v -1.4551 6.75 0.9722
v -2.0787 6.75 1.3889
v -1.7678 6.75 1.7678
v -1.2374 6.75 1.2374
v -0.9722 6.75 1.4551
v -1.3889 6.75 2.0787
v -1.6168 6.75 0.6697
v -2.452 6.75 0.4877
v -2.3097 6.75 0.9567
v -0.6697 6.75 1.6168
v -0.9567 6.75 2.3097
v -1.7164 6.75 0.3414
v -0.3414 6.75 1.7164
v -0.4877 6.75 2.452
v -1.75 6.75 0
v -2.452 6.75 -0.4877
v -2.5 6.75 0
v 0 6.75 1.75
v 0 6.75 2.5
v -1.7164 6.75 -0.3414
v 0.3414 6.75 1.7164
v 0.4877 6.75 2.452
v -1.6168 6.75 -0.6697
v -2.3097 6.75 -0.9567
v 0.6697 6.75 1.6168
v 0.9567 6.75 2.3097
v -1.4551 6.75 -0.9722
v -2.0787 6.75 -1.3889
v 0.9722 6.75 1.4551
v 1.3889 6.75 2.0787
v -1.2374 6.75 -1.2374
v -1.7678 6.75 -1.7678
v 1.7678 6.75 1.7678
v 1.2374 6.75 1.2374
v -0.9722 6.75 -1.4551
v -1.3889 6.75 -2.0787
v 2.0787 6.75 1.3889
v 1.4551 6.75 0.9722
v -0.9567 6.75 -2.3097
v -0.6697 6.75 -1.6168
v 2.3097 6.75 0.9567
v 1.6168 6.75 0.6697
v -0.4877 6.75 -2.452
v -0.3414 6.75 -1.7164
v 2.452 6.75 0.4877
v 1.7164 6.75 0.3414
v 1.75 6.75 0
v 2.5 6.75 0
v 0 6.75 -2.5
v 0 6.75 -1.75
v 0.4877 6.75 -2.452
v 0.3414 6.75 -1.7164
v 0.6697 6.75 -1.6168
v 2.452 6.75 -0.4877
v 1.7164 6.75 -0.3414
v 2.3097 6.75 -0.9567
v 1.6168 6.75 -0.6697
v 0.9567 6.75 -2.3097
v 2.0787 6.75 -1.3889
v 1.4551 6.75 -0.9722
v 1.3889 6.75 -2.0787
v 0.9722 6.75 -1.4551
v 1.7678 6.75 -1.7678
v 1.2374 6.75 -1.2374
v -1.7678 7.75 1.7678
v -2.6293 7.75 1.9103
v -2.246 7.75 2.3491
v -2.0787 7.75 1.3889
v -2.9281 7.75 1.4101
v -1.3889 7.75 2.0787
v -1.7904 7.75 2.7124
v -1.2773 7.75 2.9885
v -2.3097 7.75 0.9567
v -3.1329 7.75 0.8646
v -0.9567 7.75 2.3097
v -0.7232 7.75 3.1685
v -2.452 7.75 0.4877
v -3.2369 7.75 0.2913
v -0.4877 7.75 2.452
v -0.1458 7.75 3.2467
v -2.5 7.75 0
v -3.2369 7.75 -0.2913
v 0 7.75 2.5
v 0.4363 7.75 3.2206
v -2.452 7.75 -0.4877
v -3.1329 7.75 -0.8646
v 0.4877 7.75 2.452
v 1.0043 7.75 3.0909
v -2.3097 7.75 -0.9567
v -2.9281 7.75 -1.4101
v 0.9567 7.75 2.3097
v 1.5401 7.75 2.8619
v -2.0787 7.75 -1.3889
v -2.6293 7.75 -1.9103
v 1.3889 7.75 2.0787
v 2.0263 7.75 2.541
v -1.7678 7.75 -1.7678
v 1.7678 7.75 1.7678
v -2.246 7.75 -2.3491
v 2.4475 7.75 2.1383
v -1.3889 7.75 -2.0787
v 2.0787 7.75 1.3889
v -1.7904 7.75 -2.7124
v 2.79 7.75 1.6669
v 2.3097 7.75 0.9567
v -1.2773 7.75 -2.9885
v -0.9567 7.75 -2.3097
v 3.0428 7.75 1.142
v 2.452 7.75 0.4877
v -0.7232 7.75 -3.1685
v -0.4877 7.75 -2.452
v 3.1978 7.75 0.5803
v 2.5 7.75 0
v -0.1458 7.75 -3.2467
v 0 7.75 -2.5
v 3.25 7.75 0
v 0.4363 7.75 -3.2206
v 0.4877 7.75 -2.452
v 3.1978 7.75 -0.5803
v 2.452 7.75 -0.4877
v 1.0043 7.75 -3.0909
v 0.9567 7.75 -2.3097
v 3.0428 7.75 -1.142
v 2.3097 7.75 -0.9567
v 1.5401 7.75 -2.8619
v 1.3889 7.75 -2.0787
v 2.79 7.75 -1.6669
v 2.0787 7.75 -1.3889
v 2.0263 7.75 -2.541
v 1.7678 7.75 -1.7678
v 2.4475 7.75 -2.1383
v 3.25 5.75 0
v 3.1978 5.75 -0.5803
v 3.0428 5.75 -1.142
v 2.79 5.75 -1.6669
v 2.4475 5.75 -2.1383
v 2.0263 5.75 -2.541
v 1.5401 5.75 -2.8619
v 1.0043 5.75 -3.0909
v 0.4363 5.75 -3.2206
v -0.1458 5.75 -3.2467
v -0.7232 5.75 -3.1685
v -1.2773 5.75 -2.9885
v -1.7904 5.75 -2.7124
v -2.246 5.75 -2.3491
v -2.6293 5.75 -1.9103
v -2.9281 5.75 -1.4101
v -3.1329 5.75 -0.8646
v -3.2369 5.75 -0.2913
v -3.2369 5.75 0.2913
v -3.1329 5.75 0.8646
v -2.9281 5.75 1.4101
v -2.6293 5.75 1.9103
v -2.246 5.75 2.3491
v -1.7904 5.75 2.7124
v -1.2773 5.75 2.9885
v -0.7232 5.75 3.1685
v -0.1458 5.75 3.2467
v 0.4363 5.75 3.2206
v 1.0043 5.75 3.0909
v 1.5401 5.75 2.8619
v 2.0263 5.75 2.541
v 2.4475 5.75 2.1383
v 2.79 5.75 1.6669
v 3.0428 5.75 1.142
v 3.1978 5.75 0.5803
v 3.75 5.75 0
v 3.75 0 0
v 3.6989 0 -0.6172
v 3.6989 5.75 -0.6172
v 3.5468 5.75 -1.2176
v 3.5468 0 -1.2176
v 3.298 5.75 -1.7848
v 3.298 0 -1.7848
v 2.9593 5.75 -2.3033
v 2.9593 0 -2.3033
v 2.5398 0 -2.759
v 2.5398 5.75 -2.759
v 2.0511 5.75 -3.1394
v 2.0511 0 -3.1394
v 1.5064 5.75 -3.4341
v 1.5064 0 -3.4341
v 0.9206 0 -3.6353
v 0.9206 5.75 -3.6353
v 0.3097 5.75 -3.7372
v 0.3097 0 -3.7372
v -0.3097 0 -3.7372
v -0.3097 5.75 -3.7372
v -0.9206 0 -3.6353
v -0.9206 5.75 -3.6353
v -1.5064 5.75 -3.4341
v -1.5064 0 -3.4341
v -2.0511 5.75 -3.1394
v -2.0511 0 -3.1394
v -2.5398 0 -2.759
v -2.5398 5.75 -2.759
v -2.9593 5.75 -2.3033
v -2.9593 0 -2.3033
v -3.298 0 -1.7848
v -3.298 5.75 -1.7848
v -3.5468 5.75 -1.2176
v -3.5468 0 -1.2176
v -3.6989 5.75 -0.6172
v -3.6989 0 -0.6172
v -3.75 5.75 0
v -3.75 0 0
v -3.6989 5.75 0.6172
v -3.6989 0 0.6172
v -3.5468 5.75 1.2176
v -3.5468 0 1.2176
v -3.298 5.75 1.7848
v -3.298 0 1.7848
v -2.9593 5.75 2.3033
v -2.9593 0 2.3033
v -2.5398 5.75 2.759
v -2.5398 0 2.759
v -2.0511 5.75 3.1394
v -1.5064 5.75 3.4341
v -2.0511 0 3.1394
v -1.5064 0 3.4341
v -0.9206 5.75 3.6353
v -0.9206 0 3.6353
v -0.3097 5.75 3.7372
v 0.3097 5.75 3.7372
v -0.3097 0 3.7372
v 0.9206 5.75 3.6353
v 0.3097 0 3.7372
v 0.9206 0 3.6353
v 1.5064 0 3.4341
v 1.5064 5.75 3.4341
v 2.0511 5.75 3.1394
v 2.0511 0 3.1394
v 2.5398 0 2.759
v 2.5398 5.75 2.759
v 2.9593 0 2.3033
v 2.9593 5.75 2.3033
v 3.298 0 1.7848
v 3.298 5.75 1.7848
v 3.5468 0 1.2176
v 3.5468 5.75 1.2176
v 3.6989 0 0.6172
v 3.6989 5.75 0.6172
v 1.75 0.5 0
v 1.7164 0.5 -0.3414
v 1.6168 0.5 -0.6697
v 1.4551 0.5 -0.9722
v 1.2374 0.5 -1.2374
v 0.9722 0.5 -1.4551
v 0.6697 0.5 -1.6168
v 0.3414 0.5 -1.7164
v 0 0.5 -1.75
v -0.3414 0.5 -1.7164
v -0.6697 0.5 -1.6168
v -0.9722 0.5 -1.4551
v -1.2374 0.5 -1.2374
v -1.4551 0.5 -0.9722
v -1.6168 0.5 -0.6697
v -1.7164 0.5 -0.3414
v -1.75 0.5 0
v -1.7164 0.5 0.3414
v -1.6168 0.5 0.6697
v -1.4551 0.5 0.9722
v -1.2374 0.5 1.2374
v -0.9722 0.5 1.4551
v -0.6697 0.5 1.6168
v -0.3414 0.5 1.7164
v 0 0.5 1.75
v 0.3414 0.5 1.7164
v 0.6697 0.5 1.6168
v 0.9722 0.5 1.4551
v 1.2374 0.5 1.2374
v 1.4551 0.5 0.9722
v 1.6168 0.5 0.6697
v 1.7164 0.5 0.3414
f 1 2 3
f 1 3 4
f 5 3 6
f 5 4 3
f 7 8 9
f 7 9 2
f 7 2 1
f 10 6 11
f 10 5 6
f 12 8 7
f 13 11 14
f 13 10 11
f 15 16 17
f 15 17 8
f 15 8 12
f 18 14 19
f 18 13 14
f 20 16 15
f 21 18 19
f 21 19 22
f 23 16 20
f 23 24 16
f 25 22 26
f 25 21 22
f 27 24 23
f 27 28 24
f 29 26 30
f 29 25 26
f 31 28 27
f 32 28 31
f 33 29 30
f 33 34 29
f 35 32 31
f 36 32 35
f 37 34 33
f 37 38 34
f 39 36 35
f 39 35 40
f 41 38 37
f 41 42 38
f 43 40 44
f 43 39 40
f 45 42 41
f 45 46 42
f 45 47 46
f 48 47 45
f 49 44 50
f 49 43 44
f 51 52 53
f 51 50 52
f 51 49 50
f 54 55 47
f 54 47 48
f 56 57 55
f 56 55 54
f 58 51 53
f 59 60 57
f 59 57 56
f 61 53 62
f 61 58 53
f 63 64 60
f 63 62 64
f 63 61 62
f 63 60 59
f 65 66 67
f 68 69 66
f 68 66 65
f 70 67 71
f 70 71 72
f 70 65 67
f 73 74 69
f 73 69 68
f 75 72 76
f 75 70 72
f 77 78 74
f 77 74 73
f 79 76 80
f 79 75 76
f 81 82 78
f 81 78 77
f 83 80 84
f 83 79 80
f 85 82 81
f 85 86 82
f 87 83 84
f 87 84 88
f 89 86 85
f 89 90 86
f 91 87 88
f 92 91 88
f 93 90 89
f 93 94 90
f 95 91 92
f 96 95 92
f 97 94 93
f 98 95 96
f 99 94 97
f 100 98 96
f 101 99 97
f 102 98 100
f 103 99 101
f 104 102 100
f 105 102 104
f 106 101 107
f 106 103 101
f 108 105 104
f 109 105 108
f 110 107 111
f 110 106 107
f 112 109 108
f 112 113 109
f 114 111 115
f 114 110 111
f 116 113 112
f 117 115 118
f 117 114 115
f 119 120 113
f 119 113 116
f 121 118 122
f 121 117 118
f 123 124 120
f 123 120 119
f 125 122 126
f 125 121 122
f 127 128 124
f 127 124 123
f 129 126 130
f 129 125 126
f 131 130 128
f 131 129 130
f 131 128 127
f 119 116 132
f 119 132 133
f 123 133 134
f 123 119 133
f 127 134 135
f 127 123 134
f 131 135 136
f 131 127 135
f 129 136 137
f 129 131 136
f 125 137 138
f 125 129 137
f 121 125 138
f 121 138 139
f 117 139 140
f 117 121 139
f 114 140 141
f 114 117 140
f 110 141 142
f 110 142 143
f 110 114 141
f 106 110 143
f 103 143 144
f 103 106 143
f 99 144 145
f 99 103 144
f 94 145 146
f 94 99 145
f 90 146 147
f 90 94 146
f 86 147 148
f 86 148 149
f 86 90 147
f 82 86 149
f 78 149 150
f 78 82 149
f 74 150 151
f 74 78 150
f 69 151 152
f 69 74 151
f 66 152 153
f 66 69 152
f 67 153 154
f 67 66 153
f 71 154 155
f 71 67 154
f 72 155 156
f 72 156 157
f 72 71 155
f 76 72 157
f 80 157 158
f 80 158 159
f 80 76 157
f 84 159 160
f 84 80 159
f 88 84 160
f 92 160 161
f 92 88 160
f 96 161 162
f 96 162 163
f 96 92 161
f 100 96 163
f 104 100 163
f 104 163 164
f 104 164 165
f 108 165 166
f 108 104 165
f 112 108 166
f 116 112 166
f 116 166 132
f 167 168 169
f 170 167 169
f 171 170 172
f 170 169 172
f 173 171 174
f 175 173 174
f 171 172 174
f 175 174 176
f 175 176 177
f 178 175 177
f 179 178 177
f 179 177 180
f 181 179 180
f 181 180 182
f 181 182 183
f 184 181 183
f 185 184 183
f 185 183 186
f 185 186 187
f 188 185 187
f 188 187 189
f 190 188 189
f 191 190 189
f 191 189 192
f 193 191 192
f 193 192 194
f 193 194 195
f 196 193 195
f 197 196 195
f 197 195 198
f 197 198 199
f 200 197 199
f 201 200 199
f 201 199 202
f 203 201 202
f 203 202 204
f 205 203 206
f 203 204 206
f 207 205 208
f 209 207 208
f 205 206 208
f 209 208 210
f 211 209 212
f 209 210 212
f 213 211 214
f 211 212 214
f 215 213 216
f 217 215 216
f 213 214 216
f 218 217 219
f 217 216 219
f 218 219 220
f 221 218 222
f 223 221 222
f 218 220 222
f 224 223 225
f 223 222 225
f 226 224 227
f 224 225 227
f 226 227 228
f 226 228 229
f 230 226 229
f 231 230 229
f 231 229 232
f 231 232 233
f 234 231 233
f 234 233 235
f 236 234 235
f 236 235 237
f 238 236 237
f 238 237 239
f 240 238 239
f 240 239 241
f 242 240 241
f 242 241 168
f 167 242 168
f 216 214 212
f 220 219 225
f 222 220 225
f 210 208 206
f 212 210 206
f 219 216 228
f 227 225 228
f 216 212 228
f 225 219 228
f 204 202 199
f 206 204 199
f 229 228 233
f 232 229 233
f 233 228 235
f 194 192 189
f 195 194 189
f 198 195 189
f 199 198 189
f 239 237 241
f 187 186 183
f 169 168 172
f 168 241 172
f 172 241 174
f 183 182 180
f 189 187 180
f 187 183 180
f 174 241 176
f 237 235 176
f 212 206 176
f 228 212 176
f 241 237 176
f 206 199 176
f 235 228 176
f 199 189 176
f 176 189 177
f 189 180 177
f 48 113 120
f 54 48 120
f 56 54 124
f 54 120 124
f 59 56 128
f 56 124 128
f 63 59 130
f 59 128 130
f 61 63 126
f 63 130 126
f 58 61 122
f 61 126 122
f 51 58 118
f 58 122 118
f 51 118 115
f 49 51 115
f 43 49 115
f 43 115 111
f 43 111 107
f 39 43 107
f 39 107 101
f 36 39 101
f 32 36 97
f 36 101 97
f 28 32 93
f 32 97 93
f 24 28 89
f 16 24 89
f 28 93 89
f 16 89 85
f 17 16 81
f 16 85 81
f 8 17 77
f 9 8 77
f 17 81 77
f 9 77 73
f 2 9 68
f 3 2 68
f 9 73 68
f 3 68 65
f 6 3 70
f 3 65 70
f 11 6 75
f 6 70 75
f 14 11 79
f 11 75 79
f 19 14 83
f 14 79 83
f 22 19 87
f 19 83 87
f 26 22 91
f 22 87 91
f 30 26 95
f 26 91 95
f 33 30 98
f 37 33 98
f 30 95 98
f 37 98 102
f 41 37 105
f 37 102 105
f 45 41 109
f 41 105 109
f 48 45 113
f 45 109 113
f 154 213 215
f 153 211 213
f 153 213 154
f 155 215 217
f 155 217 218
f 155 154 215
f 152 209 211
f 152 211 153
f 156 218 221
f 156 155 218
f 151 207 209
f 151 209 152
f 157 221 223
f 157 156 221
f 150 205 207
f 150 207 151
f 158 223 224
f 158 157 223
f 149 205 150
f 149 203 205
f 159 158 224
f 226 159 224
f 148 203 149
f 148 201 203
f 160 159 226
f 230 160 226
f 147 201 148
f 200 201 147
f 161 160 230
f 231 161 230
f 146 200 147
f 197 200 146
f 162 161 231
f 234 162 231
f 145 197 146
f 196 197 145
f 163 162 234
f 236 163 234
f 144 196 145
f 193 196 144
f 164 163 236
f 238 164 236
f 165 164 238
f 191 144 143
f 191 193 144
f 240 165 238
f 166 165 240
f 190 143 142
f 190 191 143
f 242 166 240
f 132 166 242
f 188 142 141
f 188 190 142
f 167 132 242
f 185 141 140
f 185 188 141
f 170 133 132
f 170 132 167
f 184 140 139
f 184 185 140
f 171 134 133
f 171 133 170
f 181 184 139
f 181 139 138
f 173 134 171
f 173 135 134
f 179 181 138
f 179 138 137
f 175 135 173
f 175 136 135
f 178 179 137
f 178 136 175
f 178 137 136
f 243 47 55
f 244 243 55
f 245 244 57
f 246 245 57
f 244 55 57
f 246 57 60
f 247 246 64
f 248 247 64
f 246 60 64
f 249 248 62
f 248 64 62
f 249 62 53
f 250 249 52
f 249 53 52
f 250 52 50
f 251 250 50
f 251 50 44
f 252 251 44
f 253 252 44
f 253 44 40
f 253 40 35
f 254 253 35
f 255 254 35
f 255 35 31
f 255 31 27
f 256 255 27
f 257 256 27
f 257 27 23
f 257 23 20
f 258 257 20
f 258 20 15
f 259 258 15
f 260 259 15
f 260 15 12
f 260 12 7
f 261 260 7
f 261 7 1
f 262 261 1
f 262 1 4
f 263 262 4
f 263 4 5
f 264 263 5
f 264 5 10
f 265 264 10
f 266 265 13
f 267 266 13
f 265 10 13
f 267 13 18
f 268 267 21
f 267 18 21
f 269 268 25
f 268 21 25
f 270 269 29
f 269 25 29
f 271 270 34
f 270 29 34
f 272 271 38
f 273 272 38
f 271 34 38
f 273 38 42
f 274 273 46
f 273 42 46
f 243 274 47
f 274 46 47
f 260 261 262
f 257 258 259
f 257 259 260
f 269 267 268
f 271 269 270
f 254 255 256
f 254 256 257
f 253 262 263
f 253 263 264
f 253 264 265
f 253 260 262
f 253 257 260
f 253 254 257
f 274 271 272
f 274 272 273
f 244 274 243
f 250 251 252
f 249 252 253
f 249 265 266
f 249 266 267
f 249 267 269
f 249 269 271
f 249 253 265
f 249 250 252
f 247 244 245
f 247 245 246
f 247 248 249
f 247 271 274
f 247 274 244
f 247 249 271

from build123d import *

# Parameters (mm, degrees)
SKETCH1_R           = 3.75
BOSS_EXTRUDE1_DEPTH = 7.75
SKETCH3_R           = 3.75
SKETCH3_R_2         = 3.25
CUT_EXTRUDE1_DEPTH  = 2
SKETCH4_R           = 1.75
CUT_EXTRUDE2_DEPTH  = 7.25
SKETCH5_R           = 2.5
CUT_EXTRUDE3_DEPTH  = 1


with BuildPart() as part:
    # Sketch1 → Boss-Extrude1 (new body)
    with BuildSketch(Plane(origin=(0, 0, 0), x_dir=(1, 0, 0), z_dir=(0, 1, 0))):
        Circle(SKETCH1_R)
    extrude(amount=BOSS_EXTRUDE1_DEPTH)

    # Sketch3 → Cut-Extrude1 (cut)
    with BuildSketch(Plane(origin=(0, 7.75, 0), x_dir=(1, 0, 0), z_dir=(0, 1, 0))):
        Circle(SKETCH3_R)
        Circle(SKETCH3_R_2, mode=Mode.SUBTRACT)
    extrude(amount=-CUT_EXTRUDE1_DEPTH, mode=Mode.SUBTRACT)

    # Sketch4 → Cut-Extrude2 (cut)
    with BuildSketch(Plane(origin=(0, 7.75, 0), x_dir=(1, 0, 0), z_dir=(0, 1, 0))):
        Circle(SKETCH4_R)
    extrude(amount=-CUT_EXTRUDE2_DEPTH, mode=Mode.SUBTRACT)

    # Sketch5 → Cut-Extrude3 (cut)
    with BuildSketch(Plane(origin=(0, 7.75, 0), x_dir=(1, 0, 0), z_dir=(0, 1, 0))):
        Circle(SKETCH5_R)
    extrude(amount=-CUT_EXTRUDE3_DEPTH, mode=Mode.SUBTRACT)


solid = part.part
